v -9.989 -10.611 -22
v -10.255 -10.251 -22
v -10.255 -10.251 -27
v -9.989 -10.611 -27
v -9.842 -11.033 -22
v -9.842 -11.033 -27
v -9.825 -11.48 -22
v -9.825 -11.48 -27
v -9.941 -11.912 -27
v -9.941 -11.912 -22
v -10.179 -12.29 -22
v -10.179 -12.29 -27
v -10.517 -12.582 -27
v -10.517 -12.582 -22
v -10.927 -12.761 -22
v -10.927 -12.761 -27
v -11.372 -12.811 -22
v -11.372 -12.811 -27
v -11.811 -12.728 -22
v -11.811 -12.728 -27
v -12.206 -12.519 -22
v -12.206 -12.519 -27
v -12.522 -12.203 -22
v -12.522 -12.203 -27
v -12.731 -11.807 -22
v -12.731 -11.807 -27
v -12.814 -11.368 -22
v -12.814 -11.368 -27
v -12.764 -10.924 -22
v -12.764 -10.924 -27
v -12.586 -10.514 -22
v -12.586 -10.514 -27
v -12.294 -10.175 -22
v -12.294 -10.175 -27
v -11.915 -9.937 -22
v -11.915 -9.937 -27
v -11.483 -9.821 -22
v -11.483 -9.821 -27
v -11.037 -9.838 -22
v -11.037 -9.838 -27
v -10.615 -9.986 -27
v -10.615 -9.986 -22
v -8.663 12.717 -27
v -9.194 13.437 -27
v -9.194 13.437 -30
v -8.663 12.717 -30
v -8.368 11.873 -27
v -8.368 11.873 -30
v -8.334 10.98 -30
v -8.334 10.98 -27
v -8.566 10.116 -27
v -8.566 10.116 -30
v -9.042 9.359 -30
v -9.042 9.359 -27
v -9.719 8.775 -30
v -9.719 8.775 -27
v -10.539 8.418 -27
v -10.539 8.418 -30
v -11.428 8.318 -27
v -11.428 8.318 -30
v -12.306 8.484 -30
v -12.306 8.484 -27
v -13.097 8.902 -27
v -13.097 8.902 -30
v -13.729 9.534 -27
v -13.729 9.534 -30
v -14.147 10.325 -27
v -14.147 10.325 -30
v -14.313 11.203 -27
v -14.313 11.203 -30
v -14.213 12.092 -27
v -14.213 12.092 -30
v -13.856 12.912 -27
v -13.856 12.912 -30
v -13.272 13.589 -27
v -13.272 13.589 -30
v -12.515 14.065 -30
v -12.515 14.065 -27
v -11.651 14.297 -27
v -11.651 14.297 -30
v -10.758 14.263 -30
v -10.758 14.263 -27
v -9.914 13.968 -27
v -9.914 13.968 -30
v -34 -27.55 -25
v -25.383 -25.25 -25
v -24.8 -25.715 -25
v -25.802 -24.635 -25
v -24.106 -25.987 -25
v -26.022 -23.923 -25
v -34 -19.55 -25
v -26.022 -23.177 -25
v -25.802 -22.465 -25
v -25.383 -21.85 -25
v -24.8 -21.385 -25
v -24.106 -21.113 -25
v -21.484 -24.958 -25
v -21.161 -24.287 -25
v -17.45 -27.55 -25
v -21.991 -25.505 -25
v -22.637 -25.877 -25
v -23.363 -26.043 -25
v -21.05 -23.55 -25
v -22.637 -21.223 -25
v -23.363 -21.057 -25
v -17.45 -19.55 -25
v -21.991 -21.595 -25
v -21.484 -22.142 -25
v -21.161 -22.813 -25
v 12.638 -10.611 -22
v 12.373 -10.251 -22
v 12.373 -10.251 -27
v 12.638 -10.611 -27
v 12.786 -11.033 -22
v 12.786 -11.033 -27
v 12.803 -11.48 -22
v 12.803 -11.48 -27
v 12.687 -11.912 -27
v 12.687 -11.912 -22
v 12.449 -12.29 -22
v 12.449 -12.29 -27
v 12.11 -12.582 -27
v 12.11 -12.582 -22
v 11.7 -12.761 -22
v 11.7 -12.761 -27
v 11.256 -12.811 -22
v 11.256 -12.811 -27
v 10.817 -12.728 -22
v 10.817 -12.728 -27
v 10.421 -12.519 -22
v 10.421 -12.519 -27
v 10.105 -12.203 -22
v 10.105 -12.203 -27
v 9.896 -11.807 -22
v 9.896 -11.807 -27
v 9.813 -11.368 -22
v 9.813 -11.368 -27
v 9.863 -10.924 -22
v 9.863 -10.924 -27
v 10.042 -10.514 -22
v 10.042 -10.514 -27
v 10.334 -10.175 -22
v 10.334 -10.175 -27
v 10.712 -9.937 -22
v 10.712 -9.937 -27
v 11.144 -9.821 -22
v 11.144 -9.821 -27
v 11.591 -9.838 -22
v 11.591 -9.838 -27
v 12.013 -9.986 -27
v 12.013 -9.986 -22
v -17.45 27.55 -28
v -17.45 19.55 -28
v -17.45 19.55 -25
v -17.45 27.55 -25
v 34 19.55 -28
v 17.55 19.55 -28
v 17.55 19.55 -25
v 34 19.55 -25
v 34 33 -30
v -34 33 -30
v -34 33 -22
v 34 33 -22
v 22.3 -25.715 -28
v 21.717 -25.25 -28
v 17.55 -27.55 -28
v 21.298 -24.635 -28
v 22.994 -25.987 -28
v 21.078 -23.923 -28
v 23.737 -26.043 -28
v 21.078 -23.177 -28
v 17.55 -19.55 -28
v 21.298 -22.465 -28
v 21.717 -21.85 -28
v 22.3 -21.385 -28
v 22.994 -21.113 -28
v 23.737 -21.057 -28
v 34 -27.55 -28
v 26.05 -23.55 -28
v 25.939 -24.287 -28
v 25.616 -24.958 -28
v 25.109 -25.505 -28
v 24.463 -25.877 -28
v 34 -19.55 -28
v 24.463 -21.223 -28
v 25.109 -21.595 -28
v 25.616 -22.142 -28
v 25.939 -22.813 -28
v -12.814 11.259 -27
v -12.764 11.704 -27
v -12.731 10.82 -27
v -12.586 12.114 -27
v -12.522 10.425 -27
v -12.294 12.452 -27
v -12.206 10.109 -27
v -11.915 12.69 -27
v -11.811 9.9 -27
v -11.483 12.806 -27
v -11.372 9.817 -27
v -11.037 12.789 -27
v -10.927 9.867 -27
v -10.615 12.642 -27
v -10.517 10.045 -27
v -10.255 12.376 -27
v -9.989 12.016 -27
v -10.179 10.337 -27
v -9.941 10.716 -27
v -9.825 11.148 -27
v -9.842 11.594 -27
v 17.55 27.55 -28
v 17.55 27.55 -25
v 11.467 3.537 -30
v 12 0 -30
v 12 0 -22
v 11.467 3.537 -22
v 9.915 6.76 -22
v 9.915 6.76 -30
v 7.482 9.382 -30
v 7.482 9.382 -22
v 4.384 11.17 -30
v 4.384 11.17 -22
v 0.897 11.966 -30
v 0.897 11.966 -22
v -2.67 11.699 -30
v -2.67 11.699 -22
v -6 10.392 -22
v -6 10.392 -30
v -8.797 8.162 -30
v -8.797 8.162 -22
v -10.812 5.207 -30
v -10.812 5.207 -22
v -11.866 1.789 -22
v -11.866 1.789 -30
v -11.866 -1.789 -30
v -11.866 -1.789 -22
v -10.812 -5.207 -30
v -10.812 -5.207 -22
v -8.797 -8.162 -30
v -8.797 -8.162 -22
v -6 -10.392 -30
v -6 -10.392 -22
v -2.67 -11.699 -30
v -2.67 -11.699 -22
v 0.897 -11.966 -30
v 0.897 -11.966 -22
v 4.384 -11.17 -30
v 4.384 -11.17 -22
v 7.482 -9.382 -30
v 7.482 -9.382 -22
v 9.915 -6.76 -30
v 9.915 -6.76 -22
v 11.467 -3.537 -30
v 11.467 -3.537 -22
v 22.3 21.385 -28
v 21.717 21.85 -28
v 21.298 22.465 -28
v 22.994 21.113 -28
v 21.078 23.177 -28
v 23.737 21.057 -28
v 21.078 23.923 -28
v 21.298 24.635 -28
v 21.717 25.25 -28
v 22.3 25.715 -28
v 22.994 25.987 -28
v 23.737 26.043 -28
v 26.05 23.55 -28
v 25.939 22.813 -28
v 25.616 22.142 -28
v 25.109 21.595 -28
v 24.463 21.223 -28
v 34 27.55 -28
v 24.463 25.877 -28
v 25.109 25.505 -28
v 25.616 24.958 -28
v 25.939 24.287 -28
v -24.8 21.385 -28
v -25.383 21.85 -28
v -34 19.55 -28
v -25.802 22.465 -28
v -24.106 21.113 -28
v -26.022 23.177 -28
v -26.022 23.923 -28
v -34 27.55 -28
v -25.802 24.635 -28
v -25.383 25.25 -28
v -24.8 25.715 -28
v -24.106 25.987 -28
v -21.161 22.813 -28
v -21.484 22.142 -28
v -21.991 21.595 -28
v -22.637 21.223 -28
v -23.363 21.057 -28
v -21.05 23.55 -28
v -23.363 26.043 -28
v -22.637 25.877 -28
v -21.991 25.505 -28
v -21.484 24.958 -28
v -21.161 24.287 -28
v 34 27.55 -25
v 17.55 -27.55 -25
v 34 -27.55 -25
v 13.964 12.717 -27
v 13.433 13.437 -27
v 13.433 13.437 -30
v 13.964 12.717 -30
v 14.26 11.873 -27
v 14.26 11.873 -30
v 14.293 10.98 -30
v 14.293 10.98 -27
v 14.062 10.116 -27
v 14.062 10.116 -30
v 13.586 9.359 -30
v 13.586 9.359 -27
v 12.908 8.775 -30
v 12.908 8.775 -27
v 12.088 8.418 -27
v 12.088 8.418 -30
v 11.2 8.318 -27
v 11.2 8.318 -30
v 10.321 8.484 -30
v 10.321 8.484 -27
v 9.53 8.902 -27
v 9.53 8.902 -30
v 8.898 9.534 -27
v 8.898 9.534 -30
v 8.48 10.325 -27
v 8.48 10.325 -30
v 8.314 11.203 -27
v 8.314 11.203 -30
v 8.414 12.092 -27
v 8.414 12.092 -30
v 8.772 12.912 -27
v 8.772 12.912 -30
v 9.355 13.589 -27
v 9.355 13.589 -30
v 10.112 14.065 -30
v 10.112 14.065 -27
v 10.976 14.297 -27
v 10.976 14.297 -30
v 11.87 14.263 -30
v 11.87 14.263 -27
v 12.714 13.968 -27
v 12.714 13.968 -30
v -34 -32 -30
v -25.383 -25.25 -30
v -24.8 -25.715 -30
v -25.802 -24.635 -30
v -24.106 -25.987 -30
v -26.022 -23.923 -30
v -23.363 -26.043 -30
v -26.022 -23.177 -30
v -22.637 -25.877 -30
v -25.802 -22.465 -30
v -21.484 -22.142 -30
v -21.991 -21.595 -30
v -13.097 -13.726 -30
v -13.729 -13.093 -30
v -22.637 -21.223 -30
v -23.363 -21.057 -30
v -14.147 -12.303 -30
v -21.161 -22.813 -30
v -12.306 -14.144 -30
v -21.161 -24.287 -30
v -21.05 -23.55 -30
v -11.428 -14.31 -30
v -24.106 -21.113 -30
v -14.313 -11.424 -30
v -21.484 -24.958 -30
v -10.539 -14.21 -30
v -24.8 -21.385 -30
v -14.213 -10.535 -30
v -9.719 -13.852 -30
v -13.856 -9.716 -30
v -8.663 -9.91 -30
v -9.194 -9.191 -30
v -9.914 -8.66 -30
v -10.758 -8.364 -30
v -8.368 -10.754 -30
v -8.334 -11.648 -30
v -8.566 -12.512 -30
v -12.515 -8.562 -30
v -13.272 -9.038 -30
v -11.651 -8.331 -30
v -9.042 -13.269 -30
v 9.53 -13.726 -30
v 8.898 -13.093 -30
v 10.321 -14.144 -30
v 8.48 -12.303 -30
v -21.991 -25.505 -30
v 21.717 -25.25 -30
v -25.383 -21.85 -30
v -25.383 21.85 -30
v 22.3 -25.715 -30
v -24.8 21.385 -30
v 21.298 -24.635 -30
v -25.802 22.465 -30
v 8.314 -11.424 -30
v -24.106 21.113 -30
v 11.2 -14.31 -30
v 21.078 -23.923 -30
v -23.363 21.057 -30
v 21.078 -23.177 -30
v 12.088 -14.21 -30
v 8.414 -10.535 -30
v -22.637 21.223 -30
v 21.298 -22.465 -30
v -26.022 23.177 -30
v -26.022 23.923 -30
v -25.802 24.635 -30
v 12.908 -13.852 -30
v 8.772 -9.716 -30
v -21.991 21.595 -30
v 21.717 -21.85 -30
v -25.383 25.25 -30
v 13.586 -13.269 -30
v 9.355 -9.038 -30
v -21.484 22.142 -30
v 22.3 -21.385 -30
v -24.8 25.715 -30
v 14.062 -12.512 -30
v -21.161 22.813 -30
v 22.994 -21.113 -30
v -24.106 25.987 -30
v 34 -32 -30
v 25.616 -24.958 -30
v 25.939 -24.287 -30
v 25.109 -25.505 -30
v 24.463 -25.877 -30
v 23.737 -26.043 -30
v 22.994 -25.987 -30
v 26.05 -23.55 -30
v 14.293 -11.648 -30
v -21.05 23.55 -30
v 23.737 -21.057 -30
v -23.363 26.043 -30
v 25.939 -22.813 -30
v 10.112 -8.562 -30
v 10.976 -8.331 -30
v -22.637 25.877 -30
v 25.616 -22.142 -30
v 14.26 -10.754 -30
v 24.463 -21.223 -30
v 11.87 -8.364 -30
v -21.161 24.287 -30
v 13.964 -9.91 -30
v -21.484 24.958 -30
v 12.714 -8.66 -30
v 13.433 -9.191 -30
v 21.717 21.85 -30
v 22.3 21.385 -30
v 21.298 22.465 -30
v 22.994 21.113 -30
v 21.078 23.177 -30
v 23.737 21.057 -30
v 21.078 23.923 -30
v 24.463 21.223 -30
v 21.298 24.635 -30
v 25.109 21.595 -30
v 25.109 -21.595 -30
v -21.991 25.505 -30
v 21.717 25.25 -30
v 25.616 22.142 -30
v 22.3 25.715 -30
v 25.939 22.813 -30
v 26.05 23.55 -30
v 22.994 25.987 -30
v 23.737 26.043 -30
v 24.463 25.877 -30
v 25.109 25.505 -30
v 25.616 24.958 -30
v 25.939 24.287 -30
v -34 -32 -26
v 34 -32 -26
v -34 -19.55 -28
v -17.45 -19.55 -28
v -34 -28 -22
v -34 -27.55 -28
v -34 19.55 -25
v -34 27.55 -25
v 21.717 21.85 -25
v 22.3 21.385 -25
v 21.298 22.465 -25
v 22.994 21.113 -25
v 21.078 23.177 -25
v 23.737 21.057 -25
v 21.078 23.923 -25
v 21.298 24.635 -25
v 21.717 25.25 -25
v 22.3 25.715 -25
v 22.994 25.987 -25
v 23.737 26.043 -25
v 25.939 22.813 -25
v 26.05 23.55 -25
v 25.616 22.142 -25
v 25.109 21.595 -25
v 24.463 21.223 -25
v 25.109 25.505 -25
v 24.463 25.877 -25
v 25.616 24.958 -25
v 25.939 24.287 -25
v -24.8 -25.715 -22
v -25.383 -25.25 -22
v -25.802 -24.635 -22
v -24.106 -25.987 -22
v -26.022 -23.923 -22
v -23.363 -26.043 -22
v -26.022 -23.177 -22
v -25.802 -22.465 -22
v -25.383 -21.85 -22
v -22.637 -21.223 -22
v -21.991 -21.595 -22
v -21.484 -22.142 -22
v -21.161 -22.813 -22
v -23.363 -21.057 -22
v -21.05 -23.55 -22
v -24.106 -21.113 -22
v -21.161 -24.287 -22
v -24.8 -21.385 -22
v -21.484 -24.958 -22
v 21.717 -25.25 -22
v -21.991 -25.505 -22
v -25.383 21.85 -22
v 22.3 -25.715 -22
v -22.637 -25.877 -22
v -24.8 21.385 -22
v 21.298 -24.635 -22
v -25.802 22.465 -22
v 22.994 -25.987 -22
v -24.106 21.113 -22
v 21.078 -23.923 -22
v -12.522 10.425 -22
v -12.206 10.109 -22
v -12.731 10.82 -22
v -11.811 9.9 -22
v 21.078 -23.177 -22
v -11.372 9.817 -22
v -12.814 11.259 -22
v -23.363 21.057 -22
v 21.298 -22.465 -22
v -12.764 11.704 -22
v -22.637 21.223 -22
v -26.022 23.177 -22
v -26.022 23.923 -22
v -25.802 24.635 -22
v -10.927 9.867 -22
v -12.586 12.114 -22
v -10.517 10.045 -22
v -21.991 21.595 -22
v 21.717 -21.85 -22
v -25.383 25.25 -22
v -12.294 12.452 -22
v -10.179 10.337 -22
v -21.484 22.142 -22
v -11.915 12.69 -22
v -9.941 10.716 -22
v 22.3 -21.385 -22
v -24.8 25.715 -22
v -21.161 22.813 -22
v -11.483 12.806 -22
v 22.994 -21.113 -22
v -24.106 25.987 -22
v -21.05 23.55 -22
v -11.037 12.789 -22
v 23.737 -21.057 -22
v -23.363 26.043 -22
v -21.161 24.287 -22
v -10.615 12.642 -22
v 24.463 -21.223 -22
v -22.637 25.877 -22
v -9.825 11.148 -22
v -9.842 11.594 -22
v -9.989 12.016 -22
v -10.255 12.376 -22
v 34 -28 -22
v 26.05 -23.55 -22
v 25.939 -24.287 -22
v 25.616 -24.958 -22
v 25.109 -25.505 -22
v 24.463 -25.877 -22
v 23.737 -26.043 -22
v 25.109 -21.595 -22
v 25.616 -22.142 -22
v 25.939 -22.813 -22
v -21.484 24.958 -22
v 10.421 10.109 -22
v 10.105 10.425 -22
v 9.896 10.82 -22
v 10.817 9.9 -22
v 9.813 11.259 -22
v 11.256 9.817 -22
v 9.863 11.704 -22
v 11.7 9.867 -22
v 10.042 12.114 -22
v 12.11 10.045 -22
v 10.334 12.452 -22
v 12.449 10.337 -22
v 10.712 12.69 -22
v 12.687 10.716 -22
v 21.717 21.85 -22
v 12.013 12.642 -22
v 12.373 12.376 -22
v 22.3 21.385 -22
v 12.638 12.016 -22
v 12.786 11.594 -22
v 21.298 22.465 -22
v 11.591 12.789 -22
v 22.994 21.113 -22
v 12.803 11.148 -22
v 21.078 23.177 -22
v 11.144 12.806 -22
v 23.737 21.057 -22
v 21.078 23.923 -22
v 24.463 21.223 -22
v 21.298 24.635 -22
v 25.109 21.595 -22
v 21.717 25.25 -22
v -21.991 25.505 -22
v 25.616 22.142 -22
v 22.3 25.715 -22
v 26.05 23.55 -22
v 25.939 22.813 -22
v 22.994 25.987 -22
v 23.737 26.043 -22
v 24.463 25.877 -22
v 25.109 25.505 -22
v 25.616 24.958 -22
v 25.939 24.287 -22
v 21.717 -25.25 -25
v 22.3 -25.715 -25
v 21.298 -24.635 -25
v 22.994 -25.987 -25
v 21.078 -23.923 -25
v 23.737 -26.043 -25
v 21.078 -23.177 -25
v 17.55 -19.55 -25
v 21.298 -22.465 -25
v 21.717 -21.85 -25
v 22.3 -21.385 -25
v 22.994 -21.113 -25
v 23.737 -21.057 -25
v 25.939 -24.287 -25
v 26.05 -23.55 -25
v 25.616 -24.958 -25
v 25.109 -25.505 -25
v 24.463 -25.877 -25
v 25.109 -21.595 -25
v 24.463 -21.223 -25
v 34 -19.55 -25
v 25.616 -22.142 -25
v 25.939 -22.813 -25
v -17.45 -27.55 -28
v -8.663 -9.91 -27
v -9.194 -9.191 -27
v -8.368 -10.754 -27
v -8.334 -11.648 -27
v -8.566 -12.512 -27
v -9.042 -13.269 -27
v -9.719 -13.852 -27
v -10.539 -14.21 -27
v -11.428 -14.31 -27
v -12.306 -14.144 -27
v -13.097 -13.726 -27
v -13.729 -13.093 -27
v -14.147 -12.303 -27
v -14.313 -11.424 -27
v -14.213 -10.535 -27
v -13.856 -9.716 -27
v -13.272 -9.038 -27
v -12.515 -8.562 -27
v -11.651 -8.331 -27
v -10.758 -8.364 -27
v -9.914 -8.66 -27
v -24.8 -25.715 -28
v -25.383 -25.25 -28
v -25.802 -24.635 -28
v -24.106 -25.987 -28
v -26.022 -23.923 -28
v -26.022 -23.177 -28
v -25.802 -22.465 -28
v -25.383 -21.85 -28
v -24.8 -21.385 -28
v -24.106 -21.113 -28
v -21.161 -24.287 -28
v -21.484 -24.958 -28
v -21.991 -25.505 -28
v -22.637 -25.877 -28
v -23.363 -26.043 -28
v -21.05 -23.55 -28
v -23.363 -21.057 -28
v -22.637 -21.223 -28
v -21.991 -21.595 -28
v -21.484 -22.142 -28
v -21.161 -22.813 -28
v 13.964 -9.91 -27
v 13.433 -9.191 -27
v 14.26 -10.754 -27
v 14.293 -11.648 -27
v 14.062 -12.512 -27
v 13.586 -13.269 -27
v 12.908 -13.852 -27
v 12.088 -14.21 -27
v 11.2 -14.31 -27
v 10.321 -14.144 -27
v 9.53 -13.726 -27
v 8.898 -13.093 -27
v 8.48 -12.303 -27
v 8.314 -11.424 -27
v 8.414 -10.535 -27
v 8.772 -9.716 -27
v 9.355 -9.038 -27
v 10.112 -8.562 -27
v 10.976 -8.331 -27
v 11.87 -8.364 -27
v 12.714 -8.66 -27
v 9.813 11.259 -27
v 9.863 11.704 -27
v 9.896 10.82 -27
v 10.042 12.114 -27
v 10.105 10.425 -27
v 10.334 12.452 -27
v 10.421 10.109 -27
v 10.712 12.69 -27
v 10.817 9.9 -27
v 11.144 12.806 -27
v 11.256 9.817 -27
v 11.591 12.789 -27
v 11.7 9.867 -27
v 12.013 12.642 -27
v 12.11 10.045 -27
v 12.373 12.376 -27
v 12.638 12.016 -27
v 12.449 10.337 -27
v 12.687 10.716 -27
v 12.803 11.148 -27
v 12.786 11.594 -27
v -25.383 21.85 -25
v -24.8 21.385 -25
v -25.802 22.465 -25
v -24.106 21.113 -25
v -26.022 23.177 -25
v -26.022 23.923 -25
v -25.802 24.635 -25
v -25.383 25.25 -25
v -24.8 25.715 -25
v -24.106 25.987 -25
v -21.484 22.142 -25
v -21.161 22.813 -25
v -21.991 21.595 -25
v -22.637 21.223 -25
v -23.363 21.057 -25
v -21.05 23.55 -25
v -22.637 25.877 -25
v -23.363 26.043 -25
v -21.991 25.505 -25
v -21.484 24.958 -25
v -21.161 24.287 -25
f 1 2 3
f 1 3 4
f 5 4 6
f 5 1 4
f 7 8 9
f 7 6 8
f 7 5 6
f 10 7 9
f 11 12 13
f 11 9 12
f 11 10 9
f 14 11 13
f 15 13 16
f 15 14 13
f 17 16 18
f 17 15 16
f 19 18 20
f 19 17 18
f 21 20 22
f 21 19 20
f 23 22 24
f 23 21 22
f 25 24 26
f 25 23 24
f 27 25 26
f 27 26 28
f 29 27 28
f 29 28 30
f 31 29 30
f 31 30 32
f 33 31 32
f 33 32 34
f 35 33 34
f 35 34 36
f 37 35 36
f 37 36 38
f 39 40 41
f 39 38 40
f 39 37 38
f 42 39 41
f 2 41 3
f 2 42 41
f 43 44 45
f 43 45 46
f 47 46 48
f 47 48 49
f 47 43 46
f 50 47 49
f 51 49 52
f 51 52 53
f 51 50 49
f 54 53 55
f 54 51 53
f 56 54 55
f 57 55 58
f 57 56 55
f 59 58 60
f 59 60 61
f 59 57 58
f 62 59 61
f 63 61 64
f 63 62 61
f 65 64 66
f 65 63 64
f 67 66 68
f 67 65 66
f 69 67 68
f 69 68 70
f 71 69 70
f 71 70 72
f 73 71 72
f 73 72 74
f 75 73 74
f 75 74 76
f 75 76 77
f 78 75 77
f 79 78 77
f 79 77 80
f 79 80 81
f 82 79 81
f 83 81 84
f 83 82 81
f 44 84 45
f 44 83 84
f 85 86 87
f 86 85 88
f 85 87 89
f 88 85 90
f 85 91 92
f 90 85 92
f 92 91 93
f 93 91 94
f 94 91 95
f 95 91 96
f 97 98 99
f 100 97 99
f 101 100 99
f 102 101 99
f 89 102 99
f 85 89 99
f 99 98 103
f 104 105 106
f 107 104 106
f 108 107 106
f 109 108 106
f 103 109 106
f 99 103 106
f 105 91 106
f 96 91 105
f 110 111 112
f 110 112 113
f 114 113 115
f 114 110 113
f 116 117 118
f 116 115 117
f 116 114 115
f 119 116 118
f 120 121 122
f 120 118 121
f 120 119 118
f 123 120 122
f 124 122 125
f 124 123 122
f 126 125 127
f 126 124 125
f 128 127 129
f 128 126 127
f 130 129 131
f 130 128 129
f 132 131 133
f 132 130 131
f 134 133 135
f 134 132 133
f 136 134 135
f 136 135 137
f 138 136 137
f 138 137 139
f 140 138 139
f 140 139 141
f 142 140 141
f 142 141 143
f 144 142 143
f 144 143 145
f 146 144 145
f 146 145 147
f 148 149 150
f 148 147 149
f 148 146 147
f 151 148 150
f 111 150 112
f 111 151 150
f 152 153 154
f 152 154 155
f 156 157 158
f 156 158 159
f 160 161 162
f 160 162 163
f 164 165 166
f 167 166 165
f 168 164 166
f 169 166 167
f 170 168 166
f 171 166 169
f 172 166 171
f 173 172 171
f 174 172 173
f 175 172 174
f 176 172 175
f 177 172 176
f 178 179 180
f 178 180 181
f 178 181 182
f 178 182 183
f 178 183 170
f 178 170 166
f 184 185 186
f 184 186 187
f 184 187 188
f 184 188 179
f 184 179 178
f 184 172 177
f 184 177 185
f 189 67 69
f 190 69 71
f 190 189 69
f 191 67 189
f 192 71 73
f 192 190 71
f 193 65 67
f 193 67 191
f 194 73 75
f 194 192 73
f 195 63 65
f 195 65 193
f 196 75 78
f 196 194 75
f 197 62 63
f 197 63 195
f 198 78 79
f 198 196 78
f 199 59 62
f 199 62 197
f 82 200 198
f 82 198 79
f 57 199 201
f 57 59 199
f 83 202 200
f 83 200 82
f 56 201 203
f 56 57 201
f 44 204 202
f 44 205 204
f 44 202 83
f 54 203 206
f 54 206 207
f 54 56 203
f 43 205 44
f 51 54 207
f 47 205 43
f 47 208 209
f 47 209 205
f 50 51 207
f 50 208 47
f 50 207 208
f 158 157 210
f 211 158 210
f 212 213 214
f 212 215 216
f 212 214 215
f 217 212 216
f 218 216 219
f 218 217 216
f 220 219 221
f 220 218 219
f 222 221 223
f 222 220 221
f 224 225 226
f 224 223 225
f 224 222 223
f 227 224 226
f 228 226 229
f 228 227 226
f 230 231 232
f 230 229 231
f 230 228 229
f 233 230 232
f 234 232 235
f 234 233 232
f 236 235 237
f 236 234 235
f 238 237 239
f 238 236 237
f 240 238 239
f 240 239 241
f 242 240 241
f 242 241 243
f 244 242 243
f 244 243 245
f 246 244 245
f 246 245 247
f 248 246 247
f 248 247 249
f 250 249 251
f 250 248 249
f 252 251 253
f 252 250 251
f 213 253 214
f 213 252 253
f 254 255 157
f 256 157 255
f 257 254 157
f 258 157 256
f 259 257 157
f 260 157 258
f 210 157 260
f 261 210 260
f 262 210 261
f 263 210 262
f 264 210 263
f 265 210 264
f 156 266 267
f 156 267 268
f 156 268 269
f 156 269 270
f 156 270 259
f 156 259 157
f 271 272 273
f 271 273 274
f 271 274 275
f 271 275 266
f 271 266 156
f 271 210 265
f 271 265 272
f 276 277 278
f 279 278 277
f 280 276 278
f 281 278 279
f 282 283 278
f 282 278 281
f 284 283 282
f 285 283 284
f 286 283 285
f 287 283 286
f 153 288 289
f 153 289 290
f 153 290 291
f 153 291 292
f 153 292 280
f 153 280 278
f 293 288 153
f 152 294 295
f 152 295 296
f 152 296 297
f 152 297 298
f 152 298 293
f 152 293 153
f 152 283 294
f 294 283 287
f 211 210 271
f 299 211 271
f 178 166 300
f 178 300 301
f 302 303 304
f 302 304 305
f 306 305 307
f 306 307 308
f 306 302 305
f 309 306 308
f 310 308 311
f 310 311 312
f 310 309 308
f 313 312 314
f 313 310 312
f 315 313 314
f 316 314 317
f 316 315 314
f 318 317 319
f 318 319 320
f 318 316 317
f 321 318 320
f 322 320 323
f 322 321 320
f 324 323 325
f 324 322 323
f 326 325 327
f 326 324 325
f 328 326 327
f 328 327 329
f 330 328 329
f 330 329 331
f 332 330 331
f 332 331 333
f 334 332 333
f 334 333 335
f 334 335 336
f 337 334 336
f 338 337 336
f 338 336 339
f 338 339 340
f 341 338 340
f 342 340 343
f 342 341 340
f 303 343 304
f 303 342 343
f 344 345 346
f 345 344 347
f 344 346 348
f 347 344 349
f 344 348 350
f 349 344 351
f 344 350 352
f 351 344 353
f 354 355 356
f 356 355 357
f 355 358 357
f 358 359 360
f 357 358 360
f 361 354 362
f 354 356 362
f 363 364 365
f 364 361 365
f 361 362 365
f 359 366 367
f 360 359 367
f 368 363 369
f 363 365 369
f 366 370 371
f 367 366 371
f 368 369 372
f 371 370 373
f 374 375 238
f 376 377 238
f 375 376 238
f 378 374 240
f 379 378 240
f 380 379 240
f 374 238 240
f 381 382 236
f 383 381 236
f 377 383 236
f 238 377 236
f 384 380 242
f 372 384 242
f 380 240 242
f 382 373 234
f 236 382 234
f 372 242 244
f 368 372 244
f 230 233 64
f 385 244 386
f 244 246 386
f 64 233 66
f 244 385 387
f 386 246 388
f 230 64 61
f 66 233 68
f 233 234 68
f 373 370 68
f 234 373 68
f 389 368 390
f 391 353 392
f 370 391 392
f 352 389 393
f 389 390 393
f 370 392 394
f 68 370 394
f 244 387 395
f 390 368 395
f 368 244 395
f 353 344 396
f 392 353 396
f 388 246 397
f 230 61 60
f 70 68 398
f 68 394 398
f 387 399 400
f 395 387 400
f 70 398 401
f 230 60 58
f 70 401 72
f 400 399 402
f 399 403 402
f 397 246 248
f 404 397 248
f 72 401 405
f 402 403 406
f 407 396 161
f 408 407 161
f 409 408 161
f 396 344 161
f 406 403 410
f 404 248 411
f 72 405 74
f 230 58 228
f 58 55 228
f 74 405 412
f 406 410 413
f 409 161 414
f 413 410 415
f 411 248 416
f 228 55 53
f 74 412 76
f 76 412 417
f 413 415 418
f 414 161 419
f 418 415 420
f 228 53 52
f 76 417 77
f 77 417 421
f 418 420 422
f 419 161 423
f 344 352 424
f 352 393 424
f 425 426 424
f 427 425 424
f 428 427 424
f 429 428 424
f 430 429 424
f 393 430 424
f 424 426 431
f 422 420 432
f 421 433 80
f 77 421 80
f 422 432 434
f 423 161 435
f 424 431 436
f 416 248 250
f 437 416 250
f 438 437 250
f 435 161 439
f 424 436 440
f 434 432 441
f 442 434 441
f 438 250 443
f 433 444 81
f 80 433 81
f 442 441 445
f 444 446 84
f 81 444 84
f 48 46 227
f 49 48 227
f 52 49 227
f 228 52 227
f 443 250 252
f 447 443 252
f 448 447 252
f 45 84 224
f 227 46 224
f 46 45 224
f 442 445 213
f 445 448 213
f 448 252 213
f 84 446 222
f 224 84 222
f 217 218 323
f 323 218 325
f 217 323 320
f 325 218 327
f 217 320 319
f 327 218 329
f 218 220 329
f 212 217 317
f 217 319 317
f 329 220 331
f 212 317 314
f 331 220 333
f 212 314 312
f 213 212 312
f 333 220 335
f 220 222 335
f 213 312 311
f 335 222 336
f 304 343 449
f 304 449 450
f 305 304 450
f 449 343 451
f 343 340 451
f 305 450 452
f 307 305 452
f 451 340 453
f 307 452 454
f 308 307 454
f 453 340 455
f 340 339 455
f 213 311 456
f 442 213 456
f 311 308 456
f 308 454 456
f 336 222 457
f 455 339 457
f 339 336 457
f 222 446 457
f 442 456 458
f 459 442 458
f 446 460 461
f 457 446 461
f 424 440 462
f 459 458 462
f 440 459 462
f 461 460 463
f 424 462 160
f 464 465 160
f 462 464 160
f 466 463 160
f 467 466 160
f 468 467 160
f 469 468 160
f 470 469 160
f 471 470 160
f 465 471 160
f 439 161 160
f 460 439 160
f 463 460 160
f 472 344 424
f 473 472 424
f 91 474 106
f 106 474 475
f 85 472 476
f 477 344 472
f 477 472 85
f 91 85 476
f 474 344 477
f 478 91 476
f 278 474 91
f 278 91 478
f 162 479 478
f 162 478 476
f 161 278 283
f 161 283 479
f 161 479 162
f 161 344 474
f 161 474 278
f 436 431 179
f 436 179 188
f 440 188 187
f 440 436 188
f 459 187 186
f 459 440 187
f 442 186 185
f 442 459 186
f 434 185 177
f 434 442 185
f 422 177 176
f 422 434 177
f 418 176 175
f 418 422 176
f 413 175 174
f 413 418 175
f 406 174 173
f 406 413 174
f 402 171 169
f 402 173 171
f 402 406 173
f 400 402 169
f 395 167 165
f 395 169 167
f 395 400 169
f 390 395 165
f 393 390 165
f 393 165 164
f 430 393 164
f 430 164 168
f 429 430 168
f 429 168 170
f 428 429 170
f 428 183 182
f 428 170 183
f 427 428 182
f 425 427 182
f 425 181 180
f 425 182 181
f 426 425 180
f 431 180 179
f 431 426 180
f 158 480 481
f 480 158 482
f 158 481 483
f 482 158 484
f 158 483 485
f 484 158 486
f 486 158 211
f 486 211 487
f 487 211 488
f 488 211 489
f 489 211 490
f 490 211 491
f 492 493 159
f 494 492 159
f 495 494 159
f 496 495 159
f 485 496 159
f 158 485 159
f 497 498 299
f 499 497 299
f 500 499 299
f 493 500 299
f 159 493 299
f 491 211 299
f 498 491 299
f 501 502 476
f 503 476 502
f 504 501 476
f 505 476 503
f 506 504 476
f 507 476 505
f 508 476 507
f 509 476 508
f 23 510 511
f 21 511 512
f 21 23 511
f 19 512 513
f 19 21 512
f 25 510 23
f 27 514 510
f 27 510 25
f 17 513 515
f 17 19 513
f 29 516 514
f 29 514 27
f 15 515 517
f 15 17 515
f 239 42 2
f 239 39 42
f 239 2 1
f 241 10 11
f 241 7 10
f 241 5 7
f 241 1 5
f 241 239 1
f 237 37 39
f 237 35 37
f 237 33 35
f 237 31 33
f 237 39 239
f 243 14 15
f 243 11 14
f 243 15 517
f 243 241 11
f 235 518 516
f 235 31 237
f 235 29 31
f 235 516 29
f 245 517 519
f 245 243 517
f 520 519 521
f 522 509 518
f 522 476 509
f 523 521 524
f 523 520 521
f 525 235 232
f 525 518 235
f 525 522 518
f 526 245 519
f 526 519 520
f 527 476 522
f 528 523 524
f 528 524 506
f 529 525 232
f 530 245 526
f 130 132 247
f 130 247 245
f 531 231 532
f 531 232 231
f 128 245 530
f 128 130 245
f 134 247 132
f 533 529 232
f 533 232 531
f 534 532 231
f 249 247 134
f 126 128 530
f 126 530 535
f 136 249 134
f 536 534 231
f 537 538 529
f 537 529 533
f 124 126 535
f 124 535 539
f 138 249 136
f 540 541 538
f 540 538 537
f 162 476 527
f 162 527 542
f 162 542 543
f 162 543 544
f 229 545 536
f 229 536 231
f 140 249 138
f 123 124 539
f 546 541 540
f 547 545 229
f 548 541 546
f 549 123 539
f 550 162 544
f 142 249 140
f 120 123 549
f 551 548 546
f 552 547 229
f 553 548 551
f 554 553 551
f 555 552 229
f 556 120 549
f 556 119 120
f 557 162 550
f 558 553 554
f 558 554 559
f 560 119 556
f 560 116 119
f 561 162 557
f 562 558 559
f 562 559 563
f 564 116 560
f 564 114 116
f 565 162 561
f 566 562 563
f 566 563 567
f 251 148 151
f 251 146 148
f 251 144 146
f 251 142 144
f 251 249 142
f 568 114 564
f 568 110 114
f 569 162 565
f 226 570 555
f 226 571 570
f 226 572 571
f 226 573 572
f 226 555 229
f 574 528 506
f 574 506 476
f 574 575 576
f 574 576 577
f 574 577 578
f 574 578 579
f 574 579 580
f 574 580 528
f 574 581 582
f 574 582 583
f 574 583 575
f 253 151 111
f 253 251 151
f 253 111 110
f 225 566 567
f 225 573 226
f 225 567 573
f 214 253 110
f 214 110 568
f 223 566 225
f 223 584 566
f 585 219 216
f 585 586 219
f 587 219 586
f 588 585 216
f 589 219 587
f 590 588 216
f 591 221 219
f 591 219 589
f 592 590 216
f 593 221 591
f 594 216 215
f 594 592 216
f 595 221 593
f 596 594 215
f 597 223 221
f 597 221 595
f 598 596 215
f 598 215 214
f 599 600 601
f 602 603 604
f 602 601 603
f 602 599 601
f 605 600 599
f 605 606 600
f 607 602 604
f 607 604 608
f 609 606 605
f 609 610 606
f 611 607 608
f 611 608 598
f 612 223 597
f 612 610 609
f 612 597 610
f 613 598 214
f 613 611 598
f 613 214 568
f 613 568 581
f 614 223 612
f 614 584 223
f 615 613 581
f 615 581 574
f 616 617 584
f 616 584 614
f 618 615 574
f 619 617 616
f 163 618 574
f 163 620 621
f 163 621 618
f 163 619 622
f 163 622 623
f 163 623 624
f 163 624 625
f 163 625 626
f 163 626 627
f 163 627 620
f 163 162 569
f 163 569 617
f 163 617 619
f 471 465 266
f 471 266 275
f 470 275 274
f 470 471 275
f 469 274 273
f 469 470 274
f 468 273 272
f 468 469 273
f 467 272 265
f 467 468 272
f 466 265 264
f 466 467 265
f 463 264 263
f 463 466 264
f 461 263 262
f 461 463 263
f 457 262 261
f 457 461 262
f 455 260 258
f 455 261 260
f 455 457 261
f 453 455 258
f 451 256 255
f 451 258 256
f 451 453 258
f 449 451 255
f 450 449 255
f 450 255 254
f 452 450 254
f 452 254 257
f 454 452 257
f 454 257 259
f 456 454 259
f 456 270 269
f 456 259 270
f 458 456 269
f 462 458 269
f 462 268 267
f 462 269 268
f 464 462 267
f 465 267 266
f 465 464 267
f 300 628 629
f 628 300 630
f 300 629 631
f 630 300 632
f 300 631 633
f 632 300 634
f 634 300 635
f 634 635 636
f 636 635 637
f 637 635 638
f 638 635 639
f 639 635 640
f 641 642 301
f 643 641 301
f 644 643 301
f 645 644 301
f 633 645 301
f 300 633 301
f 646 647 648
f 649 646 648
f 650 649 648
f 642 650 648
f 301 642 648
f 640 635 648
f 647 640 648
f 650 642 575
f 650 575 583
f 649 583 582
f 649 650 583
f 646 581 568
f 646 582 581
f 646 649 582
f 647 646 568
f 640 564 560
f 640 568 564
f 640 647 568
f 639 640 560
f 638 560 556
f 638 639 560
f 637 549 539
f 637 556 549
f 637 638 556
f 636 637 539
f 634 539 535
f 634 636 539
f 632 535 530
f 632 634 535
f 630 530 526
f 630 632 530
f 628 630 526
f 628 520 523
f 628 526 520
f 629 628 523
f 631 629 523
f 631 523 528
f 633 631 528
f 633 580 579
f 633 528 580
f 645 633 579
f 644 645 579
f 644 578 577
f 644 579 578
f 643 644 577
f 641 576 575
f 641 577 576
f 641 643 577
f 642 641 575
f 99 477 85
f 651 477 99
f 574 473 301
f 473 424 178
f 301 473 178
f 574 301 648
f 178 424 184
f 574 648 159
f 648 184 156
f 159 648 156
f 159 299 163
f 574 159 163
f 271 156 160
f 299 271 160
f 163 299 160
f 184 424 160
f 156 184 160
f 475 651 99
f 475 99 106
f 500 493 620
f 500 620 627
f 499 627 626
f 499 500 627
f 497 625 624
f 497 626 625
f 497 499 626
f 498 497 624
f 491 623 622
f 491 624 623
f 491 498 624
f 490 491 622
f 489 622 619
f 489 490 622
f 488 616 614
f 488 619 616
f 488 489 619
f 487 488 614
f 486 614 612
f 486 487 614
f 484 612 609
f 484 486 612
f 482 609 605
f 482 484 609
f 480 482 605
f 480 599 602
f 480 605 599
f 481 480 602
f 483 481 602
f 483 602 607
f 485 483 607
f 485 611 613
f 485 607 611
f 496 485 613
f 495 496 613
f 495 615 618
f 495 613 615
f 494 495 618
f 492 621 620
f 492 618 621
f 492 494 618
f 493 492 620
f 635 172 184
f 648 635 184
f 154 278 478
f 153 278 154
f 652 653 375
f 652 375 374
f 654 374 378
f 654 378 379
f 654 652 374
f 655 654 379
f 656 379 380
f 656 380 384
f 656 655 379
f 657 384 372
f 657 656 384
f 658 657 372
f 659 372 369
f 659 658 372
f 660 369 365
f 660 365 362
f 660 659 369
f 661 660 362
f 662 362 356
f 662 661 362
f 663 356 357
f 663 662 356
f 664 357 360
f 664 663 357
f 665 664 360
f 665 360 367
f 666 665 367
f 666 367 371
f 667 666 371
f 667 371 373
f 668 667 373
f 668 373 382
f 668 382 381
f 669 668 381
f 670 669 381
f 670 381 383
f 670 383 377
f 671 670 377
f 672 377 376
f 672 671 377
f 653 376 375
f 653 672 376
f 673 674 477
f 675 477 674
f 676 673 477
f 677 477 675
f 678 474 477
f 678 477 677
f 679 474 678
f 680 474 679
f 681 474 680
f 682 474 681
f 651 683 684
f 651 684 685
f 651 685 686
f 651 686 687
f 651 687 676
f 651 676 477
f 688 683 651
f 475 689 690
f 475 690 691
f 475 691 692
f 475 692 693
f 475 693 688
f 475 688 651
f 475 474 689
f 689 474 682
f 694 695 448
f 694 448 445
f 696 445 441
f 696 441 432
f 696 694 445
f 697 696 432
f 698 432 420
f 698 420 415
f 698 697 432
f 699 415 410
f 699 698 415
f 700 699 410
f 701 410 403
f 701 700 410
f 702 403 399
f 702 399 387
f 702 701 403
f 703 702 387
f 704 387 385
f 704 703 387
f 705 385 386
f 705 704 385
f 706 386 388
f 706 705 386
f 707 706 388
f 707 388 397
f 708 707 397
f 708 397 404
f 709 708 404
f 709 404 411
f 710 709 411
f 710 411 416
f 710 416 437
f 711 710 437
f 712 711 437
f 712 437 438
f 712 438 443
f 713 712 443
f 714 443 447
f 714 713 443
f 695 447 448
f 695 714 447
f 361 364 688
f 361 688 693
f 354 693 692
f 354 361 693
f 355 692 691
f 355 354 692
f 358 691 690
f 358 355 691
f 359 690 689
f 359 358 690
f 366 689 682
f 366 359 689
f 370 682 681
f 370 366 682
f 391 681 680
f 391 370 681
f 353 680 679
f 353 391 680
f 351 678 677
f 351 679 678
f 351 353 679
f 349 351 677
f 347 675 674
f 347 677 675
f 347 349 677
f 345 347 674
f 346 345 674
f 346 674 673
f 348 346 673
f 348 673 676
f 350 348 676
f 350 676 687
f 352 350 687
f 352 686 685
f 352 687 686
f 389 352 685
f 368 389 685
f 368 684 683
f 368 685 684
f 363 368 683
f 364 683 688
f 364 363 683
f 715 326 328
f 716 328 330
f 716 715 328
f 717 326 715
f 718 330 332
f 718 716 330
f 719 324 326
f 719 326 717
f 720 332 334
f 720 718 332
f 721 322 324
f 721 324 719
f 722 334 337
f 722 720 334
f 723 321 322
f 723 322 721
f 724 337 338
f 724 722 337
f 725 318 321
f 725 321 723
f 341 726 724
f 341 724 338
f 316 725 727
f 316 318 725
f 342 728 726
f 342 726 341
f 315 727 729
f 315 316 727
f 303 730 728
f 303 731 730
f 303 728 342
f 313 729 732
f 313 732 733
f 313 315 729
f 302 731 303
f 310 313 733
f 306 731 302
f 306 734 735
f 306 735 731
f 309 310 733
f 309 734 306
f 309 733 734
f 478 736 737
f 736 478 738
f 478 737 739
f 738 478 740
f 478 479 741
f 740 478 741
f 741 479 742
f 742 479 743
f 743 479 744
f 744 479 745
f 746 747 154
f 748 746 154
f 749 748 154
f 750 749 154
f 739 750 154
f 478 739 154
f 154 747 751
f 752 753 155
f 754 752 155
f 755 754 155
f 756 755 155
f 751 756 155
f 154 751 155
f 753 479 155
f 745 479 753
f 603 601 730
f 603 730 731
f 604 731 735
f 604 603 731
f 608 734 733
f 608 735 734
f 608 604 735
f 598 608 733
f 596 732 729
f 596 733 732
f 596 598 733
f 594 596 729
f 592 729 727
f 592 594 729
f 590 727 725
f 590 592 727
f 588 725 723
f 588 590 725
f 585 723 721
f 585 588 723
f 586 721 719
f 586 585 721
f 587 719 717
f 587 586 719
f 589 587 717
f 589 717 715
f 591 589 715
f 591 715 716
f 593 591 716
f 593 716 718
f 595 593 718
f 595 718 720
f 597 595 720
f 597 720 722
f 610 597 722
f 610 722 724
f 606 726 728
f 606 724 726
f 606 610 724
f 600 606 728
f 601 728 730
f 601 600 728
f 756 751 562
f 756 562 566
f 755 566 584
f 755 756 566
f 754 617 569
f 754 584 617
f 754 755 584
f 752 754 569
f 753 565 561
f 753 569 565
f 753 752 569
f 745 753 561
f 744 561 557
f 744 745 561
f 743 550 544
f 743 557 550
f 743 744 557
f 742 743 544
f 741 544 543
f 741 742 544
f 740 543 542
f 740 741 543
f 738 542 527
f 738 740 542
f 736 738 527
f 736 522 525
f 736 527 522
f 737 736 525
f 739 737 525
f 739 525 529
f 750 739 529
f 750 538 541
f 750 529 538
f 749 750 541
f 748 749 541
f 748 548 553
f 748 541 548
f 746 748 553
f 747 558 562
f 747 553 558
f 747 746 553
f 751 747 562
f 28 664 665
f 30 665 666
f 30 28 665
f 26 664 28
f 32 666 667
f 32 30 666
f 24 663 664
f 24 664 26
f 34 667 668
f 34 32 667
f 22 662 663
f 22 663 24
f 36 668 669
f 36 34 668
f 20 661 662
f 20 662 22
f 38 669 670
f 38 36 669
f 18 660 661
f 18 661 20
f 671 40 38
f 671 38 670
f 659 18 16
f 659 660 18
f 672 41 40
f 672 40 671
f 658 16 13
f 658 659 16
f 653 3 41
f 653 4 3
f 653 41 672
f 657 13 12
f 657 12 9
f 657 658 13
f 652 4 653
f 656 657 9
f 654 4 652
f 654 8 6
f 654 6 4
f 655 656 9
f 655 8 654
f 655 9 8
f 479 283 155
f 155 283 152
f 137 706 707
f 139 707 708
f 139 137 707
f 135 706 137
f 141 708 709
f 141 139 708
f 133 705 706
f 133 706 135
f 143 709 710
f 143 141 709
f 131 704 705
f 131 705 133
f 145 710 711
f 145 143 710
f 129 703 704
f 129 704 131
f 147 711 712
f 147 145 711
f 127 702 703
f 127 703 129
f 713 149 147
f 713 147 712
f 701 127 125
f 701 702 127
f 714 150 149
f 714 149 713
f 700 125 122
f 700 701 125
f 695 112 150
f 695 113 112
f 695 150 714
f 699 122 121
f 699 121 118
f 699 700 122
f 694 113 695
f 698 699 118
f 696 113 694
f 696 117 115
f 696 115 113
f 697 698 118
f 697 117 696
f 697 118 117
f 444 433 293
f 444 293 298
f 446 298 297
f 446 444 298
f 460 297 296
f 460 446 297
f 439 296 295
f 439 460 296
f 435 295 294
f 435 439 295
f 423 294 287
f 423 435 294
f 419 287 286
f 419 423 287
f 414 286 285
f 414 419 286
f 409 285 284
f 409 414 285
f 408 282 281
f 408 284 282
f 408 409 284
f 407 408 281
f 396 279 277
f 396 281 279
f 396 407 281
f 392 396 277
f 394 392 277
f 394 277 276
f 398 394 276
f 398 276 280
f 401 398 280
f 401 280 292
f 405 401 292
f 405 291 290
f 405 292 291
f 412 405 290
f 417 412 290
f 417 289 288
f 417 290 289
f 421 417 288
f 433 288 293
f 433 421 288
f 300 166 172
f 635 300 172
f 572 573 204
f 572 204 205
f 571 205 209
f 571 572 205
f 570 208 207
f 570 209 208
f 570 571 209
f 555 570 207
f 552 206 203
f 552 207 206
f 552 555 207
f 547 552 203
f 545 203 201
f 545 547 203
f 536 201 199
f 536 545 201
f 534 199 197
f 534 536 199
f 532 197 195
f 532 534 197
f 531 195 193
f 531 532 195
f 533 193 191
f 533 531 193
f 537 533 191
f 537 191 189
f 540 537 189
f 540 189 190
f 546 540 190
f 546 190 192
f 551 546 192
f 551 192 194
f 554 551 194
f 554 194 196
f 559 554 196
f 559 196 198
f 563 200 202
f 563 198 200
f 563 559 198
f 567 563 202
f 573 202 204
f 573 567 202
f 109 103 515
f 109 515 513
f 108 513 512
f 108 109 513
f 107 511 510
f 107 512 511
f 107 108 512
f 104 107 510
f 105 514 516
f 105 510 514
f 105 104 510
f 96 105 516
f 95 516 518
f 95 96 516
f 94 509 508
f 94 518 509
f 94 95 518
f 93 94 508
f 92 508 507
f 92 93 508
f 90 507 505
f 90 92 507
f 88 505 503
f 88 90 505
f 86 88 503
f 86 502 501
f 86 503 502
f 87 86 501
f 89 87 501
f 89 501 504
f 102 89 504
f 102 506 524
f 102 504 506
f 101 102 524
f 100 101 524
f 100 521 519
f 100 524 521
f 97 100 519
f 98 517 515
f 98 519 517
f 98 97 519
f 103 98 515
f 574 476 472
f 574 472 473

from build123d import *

# Parameters (mm, degrees)
CYLINDER1852_R              = 3
CYLINDER1852_DEPTH          = 3
CYLINDER1853_R              = 3
CYLINDER1853_DEPTH          = 3
CYLINDER1854_R              = 3
CYLINDER1854_DEPTH          = 3
CYLINDER1851_R              = 3
CYLINDER1851_DEPTH          = 3
COMPOUND933_ROLL_ANGLE      = 90
COMPOUND933_PLACEMENT_ANGLE = 45
CYLINDER1848_R              = 1.5
CYLINDER1848_DEPTH          = 40
CYLINDER1850_R              = 1.5
CYLINDER1850_DEPTH          = 40
CYLINDER1849_R              = 1.5
CYLINDER1849_DEPTH          = 40
CYLINDER1847_R              = 1.5
CYLINDER1847_DEPTH          = 40
COMPOUND925_ROLL_ANGLE      = 90
COMPOUND925_PLACEMENT_ANGLE = 45
CYLINDER1867_R              = 12
CYLINDER1867_DEPTH          = 20
CYLINDER1866_R              = 2.5
CYLINDER1866_DEPTH          = 20
CYLINDER1864_R              = 2.5
CYLINDER1864_DEPTH          = 20
CYLINDER1863_R              = 2.5
CYLINDER1863_DEPTH          = 20
CYLINDER1865_R              = 2.5
CYLINDER1865_DEPTH          = 20
BOX324_W                    = 20
BOX324_H                    = 8
BOX324_DEPTH                = 3
BOX328_W                    = 20
BOX328_H                    = 8
BOX328_DEPTH                = 3
BOX330_W                    = 20
BOX330_H                    = 8
BOX330_DEPTH                = 3
BOX323_W                    = 20
BOX323_H                    = 8
BOX323_DEPTH                = 3
BOX329_W                    = 68
BOX329_H                    = 65
BOX329_DEPTH                = 8
CHAMFER014_SIZE             = 4


with BuildPart() as v_lec1852:
    # Cylinder1852 → Cylinder1852 (new body)
    with BuildSketch(Plane(origin=(16, 140, 49), x_dir=(1, 0, 0), z_dir=(0, -1, 0))):
        Circle(CYLINDER1852_R)
    extrude(amount=CYLINDER1852_DEPTH)


with BuildPart() as v_lec1853:
    # Cylinder1853 → Cylinder1853 (new body)
    with BuildSketch(Plane(origin=(-16, 140, 49), x_dir=(1, 0, 0), z_dir=(0, -1, 0))):
        Circle(CYLINDER1853_R)
    extrude(amount=CYLINDER1853_DEPTH)


with BuildPart() as v_lec1854:
    # Cylinder1854 → Cylinder1854 (new body)
    with BuildSketch(Plane(origin=(0, 140, 33), x_dir=(1, 0, 0), z_dir=(0, -1, 0))):
        Circle(CYLINDER1854_R)
    extrude(amount=CYLINDER1854_DEPTH)


with BuildPart() as compound933:
    # Cylinder1851 → Cylinder1851 (new body)
    with BuildSketch(Plane(origin=(0, 140, 65), x_dir=(1, 0, 0), z_dir=(0, -1, 0))):
        Circle(CYLINDER1851_R)
    extrude(amount=CYLINDER1851_DEPTH)

    # Compound933: union Válec1852, Válec1853, Válec1854
    add(v_lec1852.part)
    add(v_lec1853.part)
    add(v_lec1854.part)


with BuildPart() as compound933_1:
    # Compound933 roll: moved
    add(compound933.part.rotate(Axis((0, 0, 0), (1, 0, 0)), COMPOUND933_ROLL_ANGLE))


with BuildPart() as compound933_2:
    # Compound933 placement: moved
    add(compound933_1.part.moved(Location((-34.65, 34.65, -167))).rotate(Axis((-34.65, 34.65, -167), (0, 0, 1)), COMPOUND933_PLACEMENT_ANGLE))


with BuildPart() as v_lec1848:
    # Cylinder1848 → Cylinder1848 (new body)
    with BuildSketch(Plane(origin=(16, 140, 49), x_dir=(1, 0, 0), z_dir=(0, -1, 0))):
        Circle(CYLINDER1848_R)
    extrude(amount=CYLINDER1848_DEPTH)


with BuildPart() as v_lec1850:
    # Cylinder1850 → Cylinder1850 (new body)
    with BuildSketch(Plane(origin=(-16, 140, 49), x_dir=(1, 0, 0), z_dir=(0, -1, 0))):
        Circle(CYLINDER1850_R)
    extrude(amount=CYLINDER1850_DEPTH)


with BuildPart() as v_lec1849:
    # Cylinder1849 → Cylinder1849 (new body)
    with BuildSketch(Plane(origin=(0, 140, 33), x_dir=(1, 0, 0), z_dir=(0, -1, 0))):
        Circle(CYLINDER1849_R)
    extrude(amount=CYLINDER1849_DEPTH)


with BuildPart() as compound925:
    # Cylinder1847 → Cylinder1847 (new body)
    with BuildSketch(Plane(origin=(0, 140, 65), x_dir=(1, 0, 0), z_dir=(0, -1, 0))):
        Circle(CYLINDER1847_R)
    extrude(amount=CYLINDER1847_DEPTH)

    # Compound925: union Válec1848, Válec1850, Válec1849
    add(v_lec1848.part)
    add(v_lec1850.part)
    add(v_lec1849.part)


with BuildPart() as compound925_1:
    # Compound925 roll: moved
    add(compound925.part.rotate(Axis((0, 0, 0), (1, 0, 0)), COMPOUND925_ROLL_ANGLE))


with BuildPart() as compound925_2:
    # Compound925 placement: moved
    add(compound925_1.part.moved(Location((-34.65, 34.65, -144))).rotate(Axis((-34.65, 34.65, -144), (0, 0, 1)), COMPOUND925_PLACEMENT_ANGLE))


with BuildPart() as v_lec1867:
    # Cylinder1867 → Cylinder1867 (new body)
    with BuildSketch(Plane.XY.offset(-39)):
        Circle(CYLINDER1867_R)
    extrude(amount=CYLINDER1867_DEPTH)


with BuildPart() as v_lec1866:
    # Cylinder1866 → Cylinder1866 (new body)
    with BuildSketch(Plane(origin=(-23.55, 23.55, -34), x_dir=(1, 0, 0), z_dir=(0, 0, 1))):
        Circle(CYLINDER1866_R)
    extrude(amount=CYLINDER1866_DEPTH)


with BuildPart() as v_lec1864:
    # Cylinder1864 → Cylinder1864 (new body)
    with BuildSketch(Plane(origin=(-23.55, -23.55, -34), x_dir=(1, 0, 0), z_dir=(0, 0, 1))):
        Circle(CYLINDER1864_R)
    extrude(amount=CYLINDER1864_DEPTH)


with BuildPart() as v_lec1863:
    # Cylinder1863 → Cylinder1863 (new body)
    with BuildSketch(Plane(origin=(23.55, -23.55, -34), x_dir=(1, 0, 0), z_dir=(0, 0, 1))):
        Circle(CYLINDER1863_R)
    extrude(amount=CYLINDER1863_DEPTH)


with BuildPart() as compound931:
    # Cylinder1865 → Cylinder1865 (new body)
    with BuildSketch(Plane(origin=(23.55, 23.55, -34), x_dir=(1, 0, 0), z_dir=(0, 0, 1))):
        Circle(CYLINDER1865_R)
    extrude(amount=CYLINDER1865_DEPTH)

    # Compound931: union Válec1866, Válec1864, Válec1863
    add(v_lec1866.part)
    add(v_lec1864.part)
    add(v_lec1863.part)


with BuildPart() as krychle324:
    # Box324 → Box324 (new body)
    with BuildSketch(Plane(origin=(17.55, -27.55, -28), x_dir=(1, 0, 0), z_dir=(0, 0, 1))):
        with Locations((10, 4)):
            Rectangle(BOX324_W, BOX324_H)
    extrude(amount=BOX324_DEPTH)


with BuildPart() as krychle328:
    # Box328 → Box328 (new body)
    with BuildSketch(Plane(origin=(-37.45, 19.55, -28), x_dir=(1, 0, 0), z_dir=(0, 0, 1))):
        with Locations((10, 4)):
            Rectangle(BOX328_W, BOX328_H)
    extrude(amount=BOX328_DEPTH)


with BuildPart() as krychle330:
    # Box330 → Box330 (new body)
    with BuildSketch(Plane(origin=(-37.45, -27.55, -28), x_dir=(1, 0, 0), z_dir=(0, 0, 1))):
        with Locations((10, 4)):
            Rectangle(BOX330_W, BOX330_H)
    extrude(amount=BOX330_DEPTH)


with BuildPart() as compound932:
    # Box323 → Box323 (new body)
    with BuildSketch(Plane(origin=(17.55, 19.55, -28), x_dir=(1, 0, 0), z_dir=(0, 0, 1))):
        with Locations((10, 4)):
            Rectangle(BOX323_W, BOX323_H)
    extrude(amount=BOX323_DEPTH)

    # Compound932: union Krychle324, Krychle328, Krychle330
    add(krychle324.part)
    add(krychle328.part)
    add(krychle330.part)


with BuildPart() as chamfer014:
    # Box329 → Box329 (new body)
    with BuildSketch(Plane(origin=(-34, -32, -30), x_dir=(1, 0, 0), z_dir=(0, 0, 1))):
        with Locations((34, 32.5)):
            Rectangle(BOX329_W, BOX329_H)
    extrude(amount=BOX329_DEPTH)

    # Cut314: cut Compound932
    add(compound932.part, mode=Mode.SUBTRACT)

    # Cut317: cut Compound931
    add(compound931.part, mode=Mode.SUBTRACT)

    # Cut315: cut Válec1867
    add(v_lec1867.part, mode=Mode.SUBTRACT)

    # Cut319: cut Compound925
    add(compound925_2.part, mode=Mode.SUBTRACT)

    # Cut312: cut Compound933
    add(compound933_2.part, mode=Mode.SUBTRACT)

    # Chamfer014
    chamfer014_edges = [chamfer014.edges().sort_by_distance(p)[0] for p in [
        (0, -32, -22),
    ]]
    chamfer(chamfer014_edges, length=CHAMFER014_SIZE)


solid = chamfer014.part
